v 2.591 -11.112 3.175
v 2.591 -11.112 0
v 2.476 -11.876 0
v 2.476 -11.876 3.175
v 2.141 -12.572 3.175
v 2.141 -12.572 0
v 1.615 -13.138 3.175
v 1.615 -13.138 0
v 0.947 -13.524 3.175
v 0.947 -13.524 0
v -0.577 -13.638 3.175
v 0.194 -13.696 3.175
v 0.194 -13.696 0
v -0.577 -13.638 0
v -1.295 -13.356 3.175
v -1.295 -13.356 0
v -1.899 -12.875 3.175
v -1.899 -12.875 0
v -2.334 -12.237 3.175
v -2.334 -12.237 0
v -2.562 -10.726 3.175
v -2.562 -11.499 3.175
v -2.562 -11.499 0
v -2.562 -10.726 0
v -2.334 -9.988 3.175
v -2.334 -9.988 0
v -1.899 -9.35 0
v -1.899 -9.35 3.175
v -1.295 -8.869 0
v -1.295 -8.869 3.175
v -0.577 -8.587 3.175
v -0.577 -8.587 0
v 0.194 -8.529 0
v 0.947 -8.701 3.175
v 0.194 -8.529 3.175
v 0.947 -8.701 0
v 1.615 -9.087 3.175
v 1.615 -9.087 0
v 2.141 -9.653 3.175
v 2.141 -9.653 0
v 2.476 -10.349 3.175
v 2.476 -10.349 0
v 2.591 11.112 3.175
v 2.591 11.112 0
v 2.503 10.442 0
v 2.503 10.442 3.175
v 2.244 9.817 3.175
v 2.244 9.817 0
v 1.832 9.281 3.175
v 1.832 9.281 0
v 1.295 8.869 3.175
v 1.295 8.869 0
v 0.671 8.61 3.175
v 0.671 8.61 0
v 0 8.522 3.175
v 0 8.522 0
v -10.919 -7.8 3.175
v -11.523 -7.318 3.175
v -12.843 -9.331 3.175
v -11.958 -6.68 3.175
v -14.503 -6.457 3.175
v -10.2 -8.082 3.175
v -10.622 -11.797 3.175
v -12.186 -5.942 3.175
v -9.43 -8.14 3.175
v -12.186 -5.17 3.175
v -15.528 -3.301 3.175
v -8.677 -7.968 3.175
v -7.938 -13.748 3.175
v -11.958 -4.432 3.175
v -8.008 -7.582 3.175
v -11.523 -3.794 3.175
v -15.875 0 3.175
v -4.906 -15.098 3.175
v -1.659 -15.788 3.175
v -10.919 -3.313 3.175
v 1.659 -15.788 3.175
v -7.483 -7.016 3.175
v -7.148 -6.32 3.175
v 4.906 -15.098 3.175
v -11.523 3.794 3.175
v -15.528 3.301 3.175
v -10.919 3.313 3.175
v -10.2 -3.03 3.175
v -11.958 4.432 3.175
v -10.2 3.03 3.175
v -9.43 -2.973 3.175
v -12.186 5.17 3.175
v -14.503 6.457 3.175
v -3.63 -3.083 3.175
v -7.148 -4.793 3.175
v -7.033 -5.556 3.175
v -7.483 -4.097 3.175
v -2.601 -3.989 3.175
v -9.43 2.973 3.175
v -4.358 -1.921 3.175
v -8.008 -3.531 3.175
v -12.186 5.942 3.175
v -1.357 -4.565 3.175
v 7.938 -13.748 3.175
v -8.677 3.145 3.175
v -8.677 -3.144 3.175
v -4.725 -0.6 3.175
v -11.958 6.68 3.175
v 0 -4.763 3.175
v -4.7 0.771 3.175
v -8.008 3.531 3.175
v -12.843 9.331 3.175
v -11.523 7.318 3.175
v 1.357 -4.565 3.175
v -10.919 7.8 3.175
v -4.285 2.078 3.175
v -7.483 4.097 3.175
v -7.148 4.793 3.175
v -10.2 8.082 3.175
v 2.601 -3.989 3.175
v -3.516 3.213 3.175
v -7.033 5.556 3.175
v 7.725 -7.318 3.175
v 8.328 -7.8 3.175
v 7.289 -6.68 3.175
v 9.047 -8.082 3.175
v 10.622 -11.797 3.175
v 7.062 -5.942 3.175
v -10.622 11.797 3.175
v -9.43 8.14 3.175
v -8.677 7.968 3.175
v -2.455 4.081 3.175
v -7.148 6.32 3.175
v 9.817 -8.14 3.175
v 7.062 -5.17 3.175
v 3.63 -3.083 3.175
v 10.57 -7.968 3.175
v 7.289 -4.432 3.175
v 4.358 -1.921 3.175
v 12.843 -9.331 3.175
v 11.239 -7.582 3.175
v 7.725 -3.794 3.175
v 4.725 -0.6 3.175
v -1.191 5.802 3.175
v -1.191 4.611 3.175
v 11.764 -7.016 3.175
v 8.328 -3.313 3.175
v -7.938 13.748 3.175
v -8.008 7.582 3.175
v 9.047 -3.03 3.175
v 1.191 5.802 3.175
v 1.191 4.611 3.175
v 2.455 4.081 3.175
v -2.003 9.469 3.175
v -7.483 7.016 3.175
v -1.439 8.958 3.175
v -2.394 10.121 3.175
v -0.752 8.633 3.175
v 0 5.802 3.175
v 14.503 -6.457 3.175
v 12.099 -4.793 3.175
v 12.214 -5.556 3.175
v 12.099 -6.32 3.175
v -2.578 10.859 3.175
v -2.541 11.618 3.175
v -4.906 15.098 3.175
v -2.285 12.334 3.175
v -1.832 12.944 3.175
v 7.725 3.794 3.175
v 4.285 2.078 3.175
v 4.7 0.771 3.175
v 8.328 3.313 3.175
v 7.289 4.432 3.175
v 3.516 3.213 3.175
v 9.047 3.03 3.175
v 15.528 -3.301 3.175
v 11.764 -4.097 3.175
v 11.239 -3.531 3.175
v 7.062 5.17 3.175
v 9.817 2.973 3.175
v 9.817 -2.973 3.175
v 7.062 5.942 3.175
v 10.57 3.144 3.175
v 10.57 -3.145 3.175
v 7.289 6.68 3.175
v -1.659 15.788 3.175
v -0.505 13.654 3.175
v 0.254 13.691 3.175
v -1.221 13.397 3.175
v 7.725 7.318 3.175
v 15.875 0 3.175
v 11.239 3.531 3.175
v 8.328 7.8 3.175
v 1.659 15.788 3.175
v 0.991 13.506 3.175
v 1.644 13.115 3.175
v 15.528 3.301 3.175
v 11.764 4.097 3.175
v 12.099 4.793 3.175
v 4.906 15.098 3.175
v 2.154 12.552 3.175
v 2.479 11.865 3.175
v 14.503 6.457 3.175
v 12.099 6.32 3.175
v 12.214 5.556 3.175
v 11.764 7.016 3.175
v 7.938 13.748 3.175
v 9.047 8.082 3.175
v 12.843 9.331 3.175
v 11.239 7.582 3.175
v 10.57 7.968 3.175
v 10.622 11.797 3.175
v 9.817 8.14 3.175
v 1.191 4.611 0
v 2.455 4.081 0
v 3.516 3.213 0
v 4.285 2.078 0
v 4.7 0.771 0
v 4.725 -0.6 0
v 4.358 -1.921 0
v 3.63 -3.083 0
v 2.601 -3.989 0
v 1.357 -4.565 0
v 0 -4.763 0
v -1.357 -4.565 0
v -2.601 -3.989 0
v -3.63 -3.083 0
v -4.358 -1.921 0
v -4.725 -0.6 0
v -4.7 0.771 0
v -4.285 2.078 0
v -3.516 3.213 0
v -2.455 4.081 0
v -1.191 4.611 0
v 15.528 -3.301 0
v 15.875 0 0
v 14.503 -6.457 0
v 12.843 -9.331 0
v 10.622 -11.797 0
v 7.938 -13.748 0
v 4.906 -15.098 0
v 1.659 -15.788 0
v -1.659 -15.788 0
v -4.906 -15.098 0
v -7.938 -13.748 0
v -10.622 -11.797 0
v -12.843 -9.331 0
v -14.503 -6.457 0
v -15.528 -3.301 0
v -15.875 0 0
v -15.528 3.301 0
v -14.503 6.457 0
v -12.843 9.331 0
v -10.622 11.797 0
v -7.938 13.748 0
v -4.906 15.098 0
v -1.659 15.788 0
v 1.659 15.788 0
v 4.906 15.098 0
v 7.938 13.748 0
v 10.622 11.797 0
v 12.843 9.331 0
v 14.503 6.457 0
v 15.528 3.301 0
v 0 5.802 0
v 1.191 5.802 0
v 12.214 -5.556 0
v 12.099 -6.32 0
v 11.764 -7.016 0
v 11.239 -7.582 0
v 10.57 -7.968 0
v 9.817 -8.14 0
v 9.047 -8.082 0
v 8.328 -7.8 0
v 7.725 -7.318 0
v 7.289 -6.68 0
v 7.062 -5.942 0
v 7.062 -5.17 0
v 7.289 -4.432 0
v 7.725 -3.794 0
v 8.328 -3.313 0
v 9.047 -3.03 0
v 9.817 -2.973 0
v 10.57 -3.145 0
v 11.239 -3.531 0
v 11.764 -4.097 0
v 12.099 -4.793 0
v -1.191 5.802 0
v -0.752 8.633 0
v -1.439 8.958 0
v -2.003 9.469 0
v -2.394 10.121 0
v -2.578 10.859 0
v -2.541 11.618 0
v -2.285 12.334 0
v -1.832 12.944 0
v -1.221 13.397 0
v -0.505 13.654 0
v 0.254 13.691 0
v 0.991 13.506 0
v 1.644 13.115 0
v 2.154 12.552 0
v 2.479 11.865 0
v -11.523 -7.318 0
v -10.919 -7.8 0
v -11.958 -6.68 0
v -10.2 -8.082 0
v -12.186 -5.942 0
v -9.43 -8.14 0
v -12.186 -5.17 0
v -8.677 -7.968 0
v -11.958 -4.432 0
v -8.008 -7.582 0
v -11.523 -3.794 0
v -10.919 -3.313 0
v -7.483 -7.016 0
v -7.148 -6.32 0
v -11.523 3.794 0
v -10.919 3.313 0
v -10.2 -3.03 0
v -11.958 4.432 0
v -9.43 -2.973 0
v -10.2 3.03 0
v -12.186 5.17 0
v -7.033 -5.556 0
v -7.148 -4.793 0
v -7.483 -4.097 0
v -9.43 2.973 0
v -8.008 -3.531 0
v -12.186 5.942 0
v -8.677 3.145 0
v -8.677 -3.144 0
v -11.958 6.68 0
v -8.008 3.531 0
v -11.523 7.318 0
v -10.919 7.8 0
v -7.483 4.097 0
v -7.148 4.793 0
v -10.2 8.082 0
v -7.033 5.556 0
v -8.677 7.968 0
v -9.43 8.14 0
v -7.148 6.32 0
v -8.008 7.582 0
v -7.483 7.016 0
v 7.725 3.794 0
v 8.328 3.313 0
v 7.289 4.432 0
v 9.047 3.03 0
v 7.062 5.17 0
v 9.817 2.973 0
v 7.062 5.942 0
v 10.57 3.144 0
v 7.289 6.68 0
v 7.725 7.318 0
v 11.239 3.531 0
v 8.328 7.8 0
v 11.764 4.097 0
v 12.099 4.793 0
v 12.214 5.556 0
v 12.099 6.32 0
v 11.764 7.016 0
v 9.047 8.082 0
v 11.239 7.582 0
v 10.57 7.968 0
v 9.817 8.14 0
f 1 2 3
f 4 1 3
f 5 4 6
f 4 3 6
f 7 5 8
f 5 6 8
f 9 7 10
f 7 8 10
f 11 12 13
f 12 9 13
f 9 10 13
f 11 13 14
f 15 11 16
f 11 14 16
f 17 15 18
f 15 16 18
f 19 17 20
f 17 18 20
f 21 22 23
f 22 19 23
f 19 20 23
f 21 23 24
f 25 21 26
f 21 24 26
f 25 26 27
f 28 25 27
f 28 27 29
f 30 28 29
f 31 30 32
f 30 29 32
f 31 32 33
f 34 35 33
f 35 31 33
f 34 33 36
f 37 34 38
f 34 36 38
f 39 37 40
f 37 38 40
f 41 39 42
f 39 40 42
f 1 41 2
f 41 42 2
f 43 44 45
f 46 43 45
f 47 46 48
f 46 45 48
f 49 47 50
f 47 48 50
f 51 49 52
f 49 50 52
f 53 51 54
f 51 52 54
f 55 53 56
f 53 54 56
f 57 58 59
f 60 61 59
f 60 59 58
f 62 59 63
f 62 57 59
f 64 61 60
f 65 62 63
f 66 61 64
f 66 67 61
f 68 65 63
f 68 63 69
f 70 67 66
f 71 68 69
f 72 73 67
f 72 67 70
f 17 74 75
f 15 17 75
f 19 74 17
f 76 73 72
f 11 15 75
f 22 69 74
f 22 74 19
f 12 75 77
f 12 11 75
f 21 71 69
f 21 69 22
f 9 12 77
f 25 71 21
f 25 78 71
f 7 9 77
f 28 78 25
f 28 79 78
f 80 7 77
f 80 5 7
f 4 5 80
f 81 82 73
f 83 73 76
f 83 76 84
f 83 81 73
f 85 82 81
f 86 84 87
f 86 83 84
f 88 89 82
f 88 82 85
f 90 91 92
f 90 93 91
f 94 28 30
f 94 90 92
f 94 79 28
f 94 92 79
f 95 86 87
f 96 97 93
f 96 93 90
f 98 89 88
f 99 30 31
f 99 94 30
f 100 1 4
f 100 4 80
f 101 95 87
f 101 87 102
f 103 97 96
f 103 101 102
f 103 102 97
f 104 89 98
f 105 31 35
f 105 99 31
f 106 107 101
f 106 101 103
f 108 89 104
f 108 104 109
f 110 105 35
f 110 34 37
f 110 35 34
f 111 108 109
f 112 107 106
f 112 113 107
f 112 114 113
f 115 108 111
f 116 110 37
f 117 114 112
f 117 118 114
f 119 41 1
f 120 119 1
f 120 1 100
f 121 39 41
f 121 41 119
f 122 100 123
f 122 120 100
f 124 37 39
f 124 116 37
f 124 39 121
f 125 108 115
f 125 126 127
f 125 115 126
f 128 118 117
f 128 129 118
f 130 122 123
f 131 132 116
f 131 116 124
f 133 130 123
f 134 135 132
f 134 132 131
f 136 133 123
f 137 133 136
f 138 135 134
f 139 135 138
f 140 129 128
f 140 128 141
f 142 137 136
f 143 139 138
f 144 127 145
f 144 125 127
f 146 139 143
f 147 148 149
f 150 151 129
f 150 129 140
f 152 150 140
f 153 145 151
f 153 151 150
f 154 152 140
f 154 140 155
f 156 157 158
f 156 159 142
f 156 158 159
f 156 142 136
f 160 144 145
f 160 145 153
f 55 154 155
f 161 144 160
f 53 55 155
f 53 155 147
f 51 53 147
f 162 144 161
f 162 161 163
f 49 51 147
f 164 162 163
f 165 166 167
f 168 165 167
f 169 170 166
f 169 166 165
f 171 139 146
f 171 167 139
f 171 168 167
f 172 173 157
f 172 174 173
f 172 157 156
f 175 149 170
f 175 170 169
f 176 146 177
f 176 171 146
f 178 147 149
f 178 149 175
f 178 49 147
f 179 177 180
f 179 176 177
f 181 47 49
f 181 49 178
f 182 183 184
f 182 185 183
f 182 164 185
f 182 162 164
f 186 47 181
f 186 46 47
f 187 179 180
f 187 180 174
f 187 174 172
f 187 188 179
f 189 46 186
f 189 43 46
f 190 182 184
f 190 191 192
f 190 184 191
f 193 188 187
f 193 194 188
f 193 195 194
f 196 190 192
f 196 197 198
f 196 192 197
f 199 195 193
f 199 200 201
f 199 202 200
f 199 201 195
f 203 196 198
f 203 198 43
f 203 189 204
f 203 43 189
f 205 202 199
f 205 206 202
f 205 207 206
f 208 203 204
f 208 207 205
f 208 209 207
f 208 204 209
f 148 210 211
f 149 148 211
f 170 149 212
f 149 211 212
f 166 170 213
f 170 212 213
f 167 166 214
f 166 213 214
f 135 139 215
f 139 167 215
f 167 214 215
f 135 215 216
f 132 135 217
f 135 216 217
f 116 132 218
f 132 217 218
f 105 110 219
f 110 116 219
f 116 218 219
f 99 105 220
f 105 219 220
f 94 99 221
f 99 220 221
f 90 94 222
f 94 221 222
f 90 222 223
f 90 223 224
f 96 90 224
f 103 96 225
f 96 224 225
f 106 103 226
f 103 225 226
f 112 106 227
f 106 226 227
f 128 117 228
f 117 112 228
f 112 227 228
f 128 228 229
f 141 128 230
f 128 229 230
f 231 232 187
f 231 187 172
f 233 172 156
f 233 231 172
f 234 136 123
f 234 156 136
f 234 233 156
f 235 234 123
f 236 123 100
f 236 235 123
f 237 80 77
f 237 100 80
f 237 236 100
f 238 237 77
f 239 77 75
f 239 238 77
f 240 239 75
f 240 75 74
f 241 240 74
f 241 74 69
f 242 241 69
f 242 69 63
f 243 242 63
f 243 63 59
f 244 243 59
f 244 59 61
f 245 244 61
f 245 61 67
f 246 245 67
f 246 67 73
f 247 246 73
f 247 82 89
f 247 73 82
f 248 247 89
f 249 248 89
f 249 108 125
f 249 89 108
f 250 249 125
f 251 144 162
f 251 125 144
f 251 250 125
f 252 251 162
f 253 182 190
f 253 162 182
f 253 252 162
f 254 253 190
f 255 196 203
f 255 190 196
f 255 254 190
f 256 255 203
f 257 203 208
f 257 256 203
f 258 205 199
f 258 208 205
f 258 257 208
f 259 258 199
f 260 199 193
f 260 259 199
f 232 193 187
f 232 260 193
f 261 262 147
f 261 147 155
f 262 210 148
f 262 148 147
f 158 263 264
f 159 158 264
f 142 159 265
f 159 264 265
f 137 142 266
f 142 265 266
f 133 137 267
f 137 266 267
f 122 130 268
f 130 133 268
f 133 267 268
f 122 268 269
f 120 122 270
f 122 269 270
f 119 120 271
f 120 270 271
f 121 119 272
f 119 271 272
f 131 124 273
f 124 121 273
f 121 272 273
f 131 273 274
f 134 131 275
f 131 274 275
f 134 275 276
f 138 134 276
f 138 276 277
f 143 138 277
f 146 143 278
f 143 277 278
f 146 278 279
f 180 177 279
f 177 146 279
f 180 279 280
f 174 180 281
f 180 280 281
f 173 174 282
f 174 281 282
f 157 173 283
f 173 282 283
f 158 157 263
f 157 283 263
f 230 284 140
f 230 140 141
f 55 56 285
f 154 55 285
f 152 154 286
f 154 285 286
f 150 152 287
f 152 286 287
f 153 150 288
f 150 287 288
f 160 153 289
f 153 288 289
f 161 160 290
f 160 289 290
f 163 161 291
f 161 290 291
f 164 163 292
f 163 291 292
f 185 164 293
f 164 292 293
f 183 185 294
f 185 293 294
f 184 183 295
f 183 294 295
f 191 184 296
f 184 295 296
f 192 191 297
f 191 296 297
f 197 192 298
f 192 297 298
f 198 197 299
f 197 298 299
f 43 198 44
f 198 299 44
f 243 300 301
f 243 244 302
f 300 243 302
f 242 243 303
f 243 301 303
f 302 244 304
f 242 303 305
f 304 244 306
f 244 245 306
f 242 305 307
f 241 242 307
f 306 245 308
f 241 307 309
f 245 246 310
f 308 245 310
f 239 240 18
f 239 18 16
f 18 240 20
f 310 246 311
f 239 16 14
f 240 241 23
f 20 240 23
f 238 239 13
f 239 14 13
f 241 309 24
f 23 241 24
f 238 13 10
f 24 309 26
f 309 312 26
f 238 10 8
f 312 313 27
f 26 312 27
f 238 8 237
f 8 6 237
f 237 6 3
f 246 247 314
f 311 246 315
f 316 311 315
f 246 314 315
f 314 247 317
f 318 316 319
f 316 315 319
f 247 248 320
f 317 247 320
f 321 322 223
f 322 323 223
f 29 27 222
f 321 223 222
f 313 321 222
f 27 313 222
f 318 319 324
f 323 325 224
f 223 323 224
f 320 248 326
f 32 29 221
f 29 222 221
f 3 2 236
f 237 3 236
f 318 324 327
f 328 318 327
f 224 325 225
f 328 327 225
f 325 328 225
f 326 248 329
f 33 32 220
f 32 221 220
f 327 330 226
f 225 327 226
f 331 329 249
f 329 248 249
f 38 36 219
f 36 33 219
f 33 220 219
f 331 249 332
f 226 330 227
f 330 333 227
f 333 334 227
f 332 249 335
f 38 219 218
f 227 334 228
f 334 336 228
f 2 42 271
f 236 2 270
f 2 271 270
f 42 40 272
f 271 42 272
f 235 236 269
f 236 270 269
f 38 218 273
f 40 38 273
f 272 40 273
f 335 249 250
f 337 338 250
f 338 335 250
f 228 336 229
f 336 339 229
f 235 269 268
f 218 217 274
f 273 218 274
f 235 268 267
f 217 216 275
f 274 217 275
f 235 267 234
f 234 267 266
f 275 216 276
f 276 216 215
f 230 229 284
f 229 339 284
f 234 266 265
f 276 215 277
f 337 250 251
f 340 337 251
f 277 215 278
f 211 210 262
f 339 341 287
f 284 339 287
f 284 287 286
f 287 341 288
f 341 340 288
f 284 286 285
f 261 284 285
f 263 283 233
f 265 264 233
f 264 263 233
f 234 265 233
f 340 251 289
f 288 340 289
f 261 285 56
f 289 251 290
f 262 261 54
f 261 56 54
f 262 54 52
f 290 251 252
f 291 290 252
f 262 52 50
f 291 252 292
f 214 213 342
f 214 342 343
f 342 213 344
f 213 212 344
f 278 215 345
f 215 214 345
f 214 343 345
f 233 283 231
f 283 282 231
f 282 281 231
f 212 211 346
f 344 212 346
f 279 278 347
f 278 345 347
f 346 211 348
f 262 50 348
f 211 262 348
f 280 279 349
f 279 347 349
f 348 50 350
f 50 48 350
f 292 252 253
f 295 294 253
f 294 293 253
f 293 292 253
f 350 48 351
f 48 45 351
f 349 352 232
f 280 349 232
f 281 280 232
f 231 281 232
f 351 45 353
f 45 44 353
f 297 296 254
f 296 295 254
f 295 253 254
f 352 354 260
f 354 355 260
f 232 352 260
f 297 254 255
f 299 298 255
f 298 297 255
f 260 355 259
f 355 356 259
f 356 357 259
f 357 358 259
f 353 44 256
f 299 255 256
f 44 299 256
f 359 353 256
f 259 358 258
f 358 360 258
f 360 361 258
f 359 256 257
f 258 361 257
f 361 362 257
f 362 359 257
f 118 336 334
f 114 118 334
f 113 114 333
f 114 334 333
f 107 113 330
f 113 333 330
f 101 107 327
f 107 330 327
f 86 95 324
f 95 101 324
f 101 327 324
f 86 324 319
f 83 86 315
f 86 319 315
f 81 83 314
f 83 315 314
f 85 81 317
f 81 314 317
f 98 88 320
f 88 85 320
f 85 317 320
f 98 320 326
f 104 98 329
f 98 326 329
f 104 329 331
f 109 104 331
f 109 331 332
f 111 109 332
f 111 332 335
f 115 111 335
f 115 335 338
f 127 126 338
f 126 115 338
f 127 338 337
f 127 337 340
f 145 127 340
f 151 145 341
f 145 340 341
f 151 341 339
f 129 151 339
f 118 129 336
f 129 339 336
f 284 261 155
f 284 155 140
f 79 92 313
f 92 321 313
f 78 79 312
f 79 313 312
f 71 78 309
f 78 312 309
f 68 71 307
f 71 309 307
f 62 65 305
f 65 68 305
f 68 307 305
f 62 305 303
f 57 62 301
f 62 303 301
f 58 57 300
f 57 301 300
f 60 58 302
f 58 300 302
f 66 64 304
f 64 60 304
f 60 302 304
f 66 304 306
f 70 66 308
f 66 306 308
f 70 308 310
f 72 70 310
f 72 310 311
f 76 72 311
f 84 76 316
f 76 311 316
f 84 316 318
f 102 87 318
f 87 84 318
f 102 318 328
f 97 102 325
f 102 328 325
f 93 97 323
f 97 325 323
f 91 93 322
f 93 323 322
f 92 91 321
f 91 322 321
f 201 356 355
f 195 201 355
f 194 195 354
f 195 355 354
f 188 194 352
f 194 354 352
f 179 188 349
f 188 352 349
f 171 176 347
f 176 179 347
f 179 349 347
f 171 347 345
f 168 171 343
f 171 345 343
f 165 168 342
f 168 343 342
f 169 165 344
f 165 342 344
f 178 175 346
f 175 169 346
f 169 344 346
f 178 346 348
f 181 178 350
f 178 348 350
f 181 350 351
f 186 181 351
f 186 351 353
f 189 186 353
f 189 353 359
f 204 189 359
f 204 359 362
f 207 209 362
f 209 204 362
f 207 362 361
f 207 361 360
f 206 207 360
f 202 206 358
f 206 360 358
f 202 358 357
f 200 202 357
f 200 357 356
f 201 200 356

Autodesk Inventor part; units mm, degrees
ref_plane "YZ Plane" through (0, 0, 0) normal (1, 0, 0) x (0, 1, 0)
ref_plane "XZ Plane" through (0, 0, 0) normal (0, 1, 0) x (-1, 0, 0)
ref_plane "XY Plane" through (0, 0, 0) normal (0, 0, 1) x (1, 0, 0)
sketch "Sketch1" plane through (0, 0, 0) normal (0, 0, 1) x (1, 0, 0)
  arc A0 (-1.1906, 4.6113) -> (1.1906, 4.6113) centre (0, 0) ccw
  circle A1 centre (0, 0) radius 15.875
  line L0 (0, 4.7625) -> (0, 11.1125)
  circle A2 centre (0, 11.1125) radius 2.5908
  circle A3 centre (-9.6237, 5.5563) radius 2.5908
  circle A4 centre (-9.6237, -5.5562) radius 2.5908
  circle A5 centre (0, -11.1125) radius 2.5908
  circle A6 centre (9.6237, -5.5563) radius 2.5908
  circle A7 centre (9.6237, 5.5562) radius 2.5908
  line L1 (0, 0) -> (-1.1906, 0)
  line L2 (0, 0) -> (1.1906, 0)
  line L3 (1.1906, 0) -> (1.1906, 4.6113)
  line L4 (1.1906, 4.6113) -> (1.1906, 5.8019)
  line L5 (1.1906, 5.8019) -> (-1.1906, 5.8019)
  line L6 (-1.1906, 5.8019) -> (-1.1906, 4.6113)
  dimension "d0" = 9.525
  dimension "d1" = 31.75
  dimension "d2" = 6.35
  dimension "d3" = 5.1816
  dimension "d6" = 360
  dimension "d10" = 1.1906
  dimension "d11" = 1.1906
  dimension "d12" = 1.1906
extrude "Extrusion1" add sketch "Sketch1" along normal blind 3.175
properties part number "Hub for rachet" material "Steel"
